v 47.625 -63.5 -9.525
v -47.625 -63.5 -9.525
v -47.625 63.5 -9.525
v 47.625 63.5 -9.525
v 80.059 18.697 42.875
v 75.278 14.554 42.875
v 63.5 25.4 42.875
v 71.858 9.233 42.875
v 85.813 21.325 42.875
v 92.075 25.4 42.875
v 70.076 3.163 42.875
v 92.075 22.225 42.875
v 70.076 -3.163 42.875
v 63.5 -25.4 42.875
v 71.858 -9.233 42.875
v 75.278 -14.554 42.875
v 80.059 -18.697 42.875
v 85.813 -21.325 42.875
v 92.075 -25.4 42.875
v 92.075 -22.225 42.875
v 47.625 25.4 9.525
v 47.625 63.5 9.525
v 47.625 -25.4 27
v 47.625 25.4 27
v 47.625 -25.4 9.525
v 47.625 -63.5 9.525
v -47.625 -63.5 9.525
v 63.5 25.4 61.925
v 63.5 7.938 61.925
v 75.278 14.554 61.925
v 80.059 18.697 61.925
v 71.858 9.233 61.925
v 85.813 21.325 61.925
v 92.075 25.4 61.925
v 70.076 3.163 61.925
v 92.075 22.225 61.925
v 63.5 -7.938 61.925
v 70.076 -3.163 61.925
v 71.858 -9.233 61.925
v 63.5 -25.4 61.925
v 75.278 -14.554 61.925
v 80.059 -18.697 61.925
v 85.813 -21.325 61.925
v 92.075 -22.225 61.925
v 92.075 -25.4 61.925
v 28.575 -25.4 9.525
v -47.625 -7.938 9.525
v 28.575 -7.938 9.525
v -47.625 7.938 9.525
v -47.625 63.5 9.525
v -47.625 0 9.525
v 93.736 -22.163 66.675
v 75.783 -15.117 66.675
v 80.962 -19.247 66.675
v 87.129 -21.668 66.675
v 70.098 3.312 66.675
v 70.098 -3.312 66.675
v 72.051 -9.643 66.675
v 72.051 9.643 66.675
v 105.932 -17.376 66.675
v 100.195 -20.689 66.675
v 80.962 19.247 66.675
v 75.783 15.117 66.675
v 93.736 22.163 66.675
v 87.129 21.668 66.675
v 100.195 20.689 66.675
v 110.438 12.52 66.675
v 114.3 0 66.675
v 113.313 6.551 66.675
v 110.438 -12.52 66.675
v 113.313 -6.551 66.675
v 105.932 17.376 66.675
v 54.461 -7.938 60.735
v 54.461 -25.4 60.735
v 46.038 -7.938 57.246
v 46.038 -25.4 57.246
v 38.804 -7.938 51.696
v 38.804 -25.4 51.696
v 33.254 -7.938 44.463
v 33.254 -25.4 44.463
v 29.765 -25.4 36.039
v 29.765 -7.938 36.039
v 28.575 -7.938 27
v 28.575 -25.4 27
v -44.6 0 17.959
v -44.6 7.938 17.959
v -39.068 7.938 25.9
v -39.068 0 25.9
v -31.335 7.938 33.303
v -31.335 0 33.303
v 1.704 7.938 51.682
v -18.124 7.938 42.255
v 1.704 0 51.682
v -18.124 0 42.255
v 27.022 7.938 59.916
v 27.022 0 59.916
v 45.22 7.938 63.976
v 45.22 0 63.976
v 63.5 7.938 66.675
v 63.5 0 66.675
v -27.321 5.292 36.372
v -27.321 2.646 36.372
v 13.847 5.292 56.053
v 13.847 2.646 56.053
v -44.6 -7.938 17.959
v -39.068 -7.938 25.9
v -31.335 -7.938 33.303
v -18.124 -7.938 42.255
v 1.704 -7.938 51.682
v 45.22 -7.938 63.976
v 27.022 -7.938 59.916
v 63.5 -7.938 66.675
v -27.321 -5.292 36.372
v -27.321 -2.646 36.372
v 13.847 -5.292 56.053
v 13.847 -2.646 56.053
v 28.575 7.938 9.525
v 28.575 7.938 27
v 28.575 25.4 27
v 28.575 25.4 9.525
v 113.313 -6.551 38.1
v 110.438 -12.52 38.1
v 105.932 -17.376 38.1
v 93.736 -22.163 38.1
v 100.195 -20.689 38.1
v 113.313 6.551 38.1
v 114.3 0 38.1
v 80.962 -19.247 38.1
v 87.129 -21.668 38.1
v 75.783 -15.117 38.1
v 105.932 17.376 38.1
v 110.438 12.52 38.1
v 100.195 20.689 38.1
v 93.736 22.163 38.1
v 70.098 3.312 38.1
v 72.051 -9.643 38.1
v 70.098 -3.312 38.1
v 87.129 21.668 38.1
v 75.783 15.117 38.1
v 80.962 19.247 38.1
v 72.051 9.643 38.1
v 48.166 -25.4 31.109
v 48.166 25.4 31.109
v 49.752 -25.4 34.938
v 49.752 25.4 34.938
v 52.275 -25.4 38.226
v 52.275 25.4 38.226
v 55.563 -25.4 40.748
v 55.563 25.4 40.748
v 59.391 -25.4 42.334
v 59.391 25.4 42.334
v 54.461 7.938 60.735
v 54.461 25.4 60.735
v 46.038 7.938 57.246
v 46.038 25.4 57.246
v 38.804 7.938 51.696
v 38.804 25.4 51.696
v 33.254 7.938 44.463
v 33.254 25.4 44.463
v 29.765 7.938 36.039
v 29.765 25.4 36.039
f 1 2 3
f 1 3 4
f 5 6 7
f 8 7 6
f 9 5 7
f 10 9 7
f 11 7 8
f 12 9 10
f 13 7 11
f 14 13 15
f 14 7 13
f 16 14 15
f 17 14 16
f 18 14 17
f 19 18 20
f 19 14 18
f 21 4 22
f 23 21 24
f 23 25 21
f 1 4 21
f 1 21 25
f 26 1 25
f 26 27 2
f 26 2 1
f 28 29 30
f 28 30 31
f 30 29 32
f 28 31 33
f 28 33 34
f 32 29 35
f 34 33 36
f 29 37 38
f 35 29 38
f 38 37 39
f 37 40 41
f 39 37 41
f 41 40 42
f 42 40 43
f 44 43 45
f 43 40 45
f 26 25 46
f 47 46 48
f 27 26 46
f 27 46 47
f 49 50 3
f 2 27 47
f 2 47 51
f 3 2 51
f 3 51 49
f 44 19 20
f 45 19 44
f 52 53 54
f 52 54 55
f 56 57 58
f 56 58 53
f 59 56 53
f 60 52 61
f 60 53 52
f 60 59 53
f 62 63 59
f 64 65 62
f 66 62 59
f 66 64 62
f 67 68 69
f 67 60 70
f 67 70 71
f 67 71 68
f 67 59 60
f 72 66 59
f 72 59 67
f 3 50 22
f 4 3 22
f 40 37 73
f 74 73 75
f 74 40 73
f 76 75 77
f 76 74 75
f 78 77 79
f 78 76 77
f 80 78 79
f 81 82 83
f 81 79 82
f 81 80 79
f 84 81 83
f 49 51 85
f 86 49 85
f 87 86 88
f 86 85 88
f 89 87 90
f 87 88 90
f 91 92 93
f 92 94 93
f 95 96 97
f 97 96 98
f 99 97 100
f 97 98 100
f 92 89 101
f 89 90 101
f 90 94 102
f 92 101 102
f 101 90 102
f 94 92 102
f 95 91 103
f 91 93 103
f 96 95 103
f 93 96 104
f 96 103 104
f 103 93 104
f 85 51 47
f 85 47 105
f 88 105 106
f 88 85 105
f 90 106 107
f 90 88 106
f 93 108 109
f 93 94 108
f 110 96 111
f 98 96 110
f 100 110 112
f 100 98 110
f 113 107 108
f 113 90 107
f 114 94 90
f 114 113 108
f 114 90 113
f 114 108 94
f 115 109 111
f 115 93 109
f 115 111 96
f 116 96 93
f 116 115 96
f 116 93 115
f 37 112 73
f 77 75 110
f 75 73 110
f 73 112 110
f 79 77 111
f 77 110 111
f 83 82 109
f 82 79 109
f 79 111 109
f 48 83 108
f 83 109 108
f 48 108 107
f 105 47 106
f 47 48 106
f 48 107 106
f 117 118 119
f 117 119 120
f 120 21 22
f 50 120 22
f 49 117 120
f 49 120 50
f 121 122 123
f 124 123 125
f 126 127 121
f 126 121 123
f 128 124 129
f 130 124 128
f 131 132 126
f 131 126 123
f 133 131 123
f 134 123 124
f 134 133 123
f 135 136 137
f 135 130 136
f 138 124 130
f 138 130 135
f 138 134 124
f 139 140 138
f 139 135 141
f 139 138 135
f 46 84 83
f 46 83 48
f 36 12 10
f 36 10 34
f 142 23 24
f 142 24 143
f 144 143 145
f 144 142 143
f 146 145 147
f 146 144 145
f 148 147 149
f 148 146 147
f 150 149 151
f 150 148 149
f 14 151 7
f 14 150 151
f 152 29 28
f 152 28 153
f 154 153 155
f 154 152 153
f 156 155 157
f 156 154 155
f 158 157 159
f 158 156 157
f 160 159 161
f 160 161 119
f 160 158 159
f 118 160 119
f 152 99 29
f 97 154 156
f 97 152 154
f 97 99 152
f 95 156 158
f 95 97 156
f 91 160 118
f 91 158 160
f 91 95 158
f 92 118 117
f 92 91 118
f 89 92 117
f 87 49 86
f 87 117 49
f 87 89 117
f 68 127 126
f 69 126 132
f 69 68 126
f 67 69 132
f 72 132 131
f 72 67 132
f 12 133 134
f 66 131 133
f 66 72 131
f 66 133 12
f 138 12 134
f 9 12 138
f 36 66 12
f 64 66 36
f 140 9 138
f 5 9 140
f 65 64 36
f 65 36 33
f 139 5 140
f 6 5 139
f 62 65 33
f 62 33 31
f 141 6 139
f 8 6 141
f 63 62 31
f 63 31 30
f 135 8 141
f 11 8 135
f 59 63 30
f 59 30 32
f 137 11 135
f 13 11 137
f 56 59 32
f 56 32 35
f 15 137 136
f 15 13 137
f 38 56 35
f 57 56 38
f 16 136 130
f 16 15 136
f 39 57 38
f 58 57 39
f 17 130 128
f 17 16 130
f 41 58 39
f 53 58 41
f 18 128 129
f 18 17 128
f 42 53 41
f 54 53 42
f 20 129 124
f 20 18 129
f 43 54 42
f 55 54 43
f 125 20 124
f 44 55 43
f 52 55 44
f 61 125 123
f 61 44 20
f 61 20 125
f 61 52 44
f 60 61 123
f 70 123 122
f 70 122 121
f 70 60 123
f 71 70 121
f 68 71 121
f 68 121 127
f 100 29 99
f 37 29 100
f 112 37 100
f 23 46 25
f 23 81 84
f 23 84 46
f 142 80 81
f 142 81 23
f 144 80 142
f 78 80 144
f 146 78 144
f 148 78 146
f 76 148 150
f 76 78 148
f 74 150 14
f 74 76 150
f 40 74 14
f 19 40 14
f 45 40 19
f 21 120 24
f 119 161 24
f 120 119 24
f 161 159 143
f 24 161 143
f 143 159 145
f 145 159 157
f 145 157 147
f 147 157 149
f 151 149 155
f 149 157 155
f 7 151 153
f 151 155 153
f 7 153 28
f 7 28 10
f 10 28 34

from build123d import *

# Parameters (mm, degrees)
F1_DEPTH = 63.5
F0_W     = 28.575
F0_H     = 19.05
F2_DEPTH = 25.4
F3_DEPTH = 7.9375


with BuildPart() as f1:
    # F0 (on Front) → F1 (new body, symmetric)
    with BuildSketch(Plane.XZ):
        Polygon((-47.625, 9.525), (-47.625, -9.525), (47.625, -9.525), (47.625, 9.525), (28.575, 9.525), align=None)
    extrude(amount=F1_DEPTH, both=True)

    # F0 (on Front) → F2 (join, symmetric)
    with BuildSketch(Plane.XZ):
        with BuildLine():
            Line((28.575, 9.525), (47.625, 9.525))
            Line((47.625, 9.525), (47.625, 27.0002))
            ThreePointArc((47.625, 27.0002), (52.27468, 38.22552), (63.5, 42.8752))
            Line((63.5, 42.8752), (63.5, 61.9252))
            ThreePointArc((63.5, 61.9252), (38.804296, 51.695904), (28.575, 27.0002))
            Line((28.575, 27.0002), (28.575, 9.525))
        make_face()
        with Locations((77.7875, 52.4002)):
            Rectangle(F0_W, F0_H)
    extrude(amount=F2_DEPTH, both=True)

    # F0 (on Front) → F3 (join, symmetric)
    with BuildSketch(Plane.XZ):
        with BuildLine():
            add(Edge.make_bspline(
                [(-47.625, 9.525), (-41.878503, 39.32336), (13.729675, 61.214211), (63.5, 66.675)],
                knots=[0, 0, 0, 0, 124.959546, 124.959546, 124.959546, 124.959546], degree=3))
            Line((-47.625, 9.525), (28.575, 9.525))
            Line((28.575, 9.525), (28.575, 27.0002))
            ThreePointArc((28.575, 27.0002), (38.804296, 51.695904), (63.5, 61.9252))
            Line((63.5, 61.9252), (63.5, 66.675))
        make_face()
    extrude(amount=F3_DEPTH, both=True)

    # F0 (on Front) → F4 (revolve)
    with BuildSketch(Plane.XZ):
        Polygon((114.3, 66.675), (92.075, 66.675), (92.075, 61.9252), (92.075, 42.8752), (92.075, 38.1), (114.3, 38.1), align=None)
    revolve(axis=Axis((92.075, 0, 52.3875), (0, 0, 1)))


solid = f1.part
